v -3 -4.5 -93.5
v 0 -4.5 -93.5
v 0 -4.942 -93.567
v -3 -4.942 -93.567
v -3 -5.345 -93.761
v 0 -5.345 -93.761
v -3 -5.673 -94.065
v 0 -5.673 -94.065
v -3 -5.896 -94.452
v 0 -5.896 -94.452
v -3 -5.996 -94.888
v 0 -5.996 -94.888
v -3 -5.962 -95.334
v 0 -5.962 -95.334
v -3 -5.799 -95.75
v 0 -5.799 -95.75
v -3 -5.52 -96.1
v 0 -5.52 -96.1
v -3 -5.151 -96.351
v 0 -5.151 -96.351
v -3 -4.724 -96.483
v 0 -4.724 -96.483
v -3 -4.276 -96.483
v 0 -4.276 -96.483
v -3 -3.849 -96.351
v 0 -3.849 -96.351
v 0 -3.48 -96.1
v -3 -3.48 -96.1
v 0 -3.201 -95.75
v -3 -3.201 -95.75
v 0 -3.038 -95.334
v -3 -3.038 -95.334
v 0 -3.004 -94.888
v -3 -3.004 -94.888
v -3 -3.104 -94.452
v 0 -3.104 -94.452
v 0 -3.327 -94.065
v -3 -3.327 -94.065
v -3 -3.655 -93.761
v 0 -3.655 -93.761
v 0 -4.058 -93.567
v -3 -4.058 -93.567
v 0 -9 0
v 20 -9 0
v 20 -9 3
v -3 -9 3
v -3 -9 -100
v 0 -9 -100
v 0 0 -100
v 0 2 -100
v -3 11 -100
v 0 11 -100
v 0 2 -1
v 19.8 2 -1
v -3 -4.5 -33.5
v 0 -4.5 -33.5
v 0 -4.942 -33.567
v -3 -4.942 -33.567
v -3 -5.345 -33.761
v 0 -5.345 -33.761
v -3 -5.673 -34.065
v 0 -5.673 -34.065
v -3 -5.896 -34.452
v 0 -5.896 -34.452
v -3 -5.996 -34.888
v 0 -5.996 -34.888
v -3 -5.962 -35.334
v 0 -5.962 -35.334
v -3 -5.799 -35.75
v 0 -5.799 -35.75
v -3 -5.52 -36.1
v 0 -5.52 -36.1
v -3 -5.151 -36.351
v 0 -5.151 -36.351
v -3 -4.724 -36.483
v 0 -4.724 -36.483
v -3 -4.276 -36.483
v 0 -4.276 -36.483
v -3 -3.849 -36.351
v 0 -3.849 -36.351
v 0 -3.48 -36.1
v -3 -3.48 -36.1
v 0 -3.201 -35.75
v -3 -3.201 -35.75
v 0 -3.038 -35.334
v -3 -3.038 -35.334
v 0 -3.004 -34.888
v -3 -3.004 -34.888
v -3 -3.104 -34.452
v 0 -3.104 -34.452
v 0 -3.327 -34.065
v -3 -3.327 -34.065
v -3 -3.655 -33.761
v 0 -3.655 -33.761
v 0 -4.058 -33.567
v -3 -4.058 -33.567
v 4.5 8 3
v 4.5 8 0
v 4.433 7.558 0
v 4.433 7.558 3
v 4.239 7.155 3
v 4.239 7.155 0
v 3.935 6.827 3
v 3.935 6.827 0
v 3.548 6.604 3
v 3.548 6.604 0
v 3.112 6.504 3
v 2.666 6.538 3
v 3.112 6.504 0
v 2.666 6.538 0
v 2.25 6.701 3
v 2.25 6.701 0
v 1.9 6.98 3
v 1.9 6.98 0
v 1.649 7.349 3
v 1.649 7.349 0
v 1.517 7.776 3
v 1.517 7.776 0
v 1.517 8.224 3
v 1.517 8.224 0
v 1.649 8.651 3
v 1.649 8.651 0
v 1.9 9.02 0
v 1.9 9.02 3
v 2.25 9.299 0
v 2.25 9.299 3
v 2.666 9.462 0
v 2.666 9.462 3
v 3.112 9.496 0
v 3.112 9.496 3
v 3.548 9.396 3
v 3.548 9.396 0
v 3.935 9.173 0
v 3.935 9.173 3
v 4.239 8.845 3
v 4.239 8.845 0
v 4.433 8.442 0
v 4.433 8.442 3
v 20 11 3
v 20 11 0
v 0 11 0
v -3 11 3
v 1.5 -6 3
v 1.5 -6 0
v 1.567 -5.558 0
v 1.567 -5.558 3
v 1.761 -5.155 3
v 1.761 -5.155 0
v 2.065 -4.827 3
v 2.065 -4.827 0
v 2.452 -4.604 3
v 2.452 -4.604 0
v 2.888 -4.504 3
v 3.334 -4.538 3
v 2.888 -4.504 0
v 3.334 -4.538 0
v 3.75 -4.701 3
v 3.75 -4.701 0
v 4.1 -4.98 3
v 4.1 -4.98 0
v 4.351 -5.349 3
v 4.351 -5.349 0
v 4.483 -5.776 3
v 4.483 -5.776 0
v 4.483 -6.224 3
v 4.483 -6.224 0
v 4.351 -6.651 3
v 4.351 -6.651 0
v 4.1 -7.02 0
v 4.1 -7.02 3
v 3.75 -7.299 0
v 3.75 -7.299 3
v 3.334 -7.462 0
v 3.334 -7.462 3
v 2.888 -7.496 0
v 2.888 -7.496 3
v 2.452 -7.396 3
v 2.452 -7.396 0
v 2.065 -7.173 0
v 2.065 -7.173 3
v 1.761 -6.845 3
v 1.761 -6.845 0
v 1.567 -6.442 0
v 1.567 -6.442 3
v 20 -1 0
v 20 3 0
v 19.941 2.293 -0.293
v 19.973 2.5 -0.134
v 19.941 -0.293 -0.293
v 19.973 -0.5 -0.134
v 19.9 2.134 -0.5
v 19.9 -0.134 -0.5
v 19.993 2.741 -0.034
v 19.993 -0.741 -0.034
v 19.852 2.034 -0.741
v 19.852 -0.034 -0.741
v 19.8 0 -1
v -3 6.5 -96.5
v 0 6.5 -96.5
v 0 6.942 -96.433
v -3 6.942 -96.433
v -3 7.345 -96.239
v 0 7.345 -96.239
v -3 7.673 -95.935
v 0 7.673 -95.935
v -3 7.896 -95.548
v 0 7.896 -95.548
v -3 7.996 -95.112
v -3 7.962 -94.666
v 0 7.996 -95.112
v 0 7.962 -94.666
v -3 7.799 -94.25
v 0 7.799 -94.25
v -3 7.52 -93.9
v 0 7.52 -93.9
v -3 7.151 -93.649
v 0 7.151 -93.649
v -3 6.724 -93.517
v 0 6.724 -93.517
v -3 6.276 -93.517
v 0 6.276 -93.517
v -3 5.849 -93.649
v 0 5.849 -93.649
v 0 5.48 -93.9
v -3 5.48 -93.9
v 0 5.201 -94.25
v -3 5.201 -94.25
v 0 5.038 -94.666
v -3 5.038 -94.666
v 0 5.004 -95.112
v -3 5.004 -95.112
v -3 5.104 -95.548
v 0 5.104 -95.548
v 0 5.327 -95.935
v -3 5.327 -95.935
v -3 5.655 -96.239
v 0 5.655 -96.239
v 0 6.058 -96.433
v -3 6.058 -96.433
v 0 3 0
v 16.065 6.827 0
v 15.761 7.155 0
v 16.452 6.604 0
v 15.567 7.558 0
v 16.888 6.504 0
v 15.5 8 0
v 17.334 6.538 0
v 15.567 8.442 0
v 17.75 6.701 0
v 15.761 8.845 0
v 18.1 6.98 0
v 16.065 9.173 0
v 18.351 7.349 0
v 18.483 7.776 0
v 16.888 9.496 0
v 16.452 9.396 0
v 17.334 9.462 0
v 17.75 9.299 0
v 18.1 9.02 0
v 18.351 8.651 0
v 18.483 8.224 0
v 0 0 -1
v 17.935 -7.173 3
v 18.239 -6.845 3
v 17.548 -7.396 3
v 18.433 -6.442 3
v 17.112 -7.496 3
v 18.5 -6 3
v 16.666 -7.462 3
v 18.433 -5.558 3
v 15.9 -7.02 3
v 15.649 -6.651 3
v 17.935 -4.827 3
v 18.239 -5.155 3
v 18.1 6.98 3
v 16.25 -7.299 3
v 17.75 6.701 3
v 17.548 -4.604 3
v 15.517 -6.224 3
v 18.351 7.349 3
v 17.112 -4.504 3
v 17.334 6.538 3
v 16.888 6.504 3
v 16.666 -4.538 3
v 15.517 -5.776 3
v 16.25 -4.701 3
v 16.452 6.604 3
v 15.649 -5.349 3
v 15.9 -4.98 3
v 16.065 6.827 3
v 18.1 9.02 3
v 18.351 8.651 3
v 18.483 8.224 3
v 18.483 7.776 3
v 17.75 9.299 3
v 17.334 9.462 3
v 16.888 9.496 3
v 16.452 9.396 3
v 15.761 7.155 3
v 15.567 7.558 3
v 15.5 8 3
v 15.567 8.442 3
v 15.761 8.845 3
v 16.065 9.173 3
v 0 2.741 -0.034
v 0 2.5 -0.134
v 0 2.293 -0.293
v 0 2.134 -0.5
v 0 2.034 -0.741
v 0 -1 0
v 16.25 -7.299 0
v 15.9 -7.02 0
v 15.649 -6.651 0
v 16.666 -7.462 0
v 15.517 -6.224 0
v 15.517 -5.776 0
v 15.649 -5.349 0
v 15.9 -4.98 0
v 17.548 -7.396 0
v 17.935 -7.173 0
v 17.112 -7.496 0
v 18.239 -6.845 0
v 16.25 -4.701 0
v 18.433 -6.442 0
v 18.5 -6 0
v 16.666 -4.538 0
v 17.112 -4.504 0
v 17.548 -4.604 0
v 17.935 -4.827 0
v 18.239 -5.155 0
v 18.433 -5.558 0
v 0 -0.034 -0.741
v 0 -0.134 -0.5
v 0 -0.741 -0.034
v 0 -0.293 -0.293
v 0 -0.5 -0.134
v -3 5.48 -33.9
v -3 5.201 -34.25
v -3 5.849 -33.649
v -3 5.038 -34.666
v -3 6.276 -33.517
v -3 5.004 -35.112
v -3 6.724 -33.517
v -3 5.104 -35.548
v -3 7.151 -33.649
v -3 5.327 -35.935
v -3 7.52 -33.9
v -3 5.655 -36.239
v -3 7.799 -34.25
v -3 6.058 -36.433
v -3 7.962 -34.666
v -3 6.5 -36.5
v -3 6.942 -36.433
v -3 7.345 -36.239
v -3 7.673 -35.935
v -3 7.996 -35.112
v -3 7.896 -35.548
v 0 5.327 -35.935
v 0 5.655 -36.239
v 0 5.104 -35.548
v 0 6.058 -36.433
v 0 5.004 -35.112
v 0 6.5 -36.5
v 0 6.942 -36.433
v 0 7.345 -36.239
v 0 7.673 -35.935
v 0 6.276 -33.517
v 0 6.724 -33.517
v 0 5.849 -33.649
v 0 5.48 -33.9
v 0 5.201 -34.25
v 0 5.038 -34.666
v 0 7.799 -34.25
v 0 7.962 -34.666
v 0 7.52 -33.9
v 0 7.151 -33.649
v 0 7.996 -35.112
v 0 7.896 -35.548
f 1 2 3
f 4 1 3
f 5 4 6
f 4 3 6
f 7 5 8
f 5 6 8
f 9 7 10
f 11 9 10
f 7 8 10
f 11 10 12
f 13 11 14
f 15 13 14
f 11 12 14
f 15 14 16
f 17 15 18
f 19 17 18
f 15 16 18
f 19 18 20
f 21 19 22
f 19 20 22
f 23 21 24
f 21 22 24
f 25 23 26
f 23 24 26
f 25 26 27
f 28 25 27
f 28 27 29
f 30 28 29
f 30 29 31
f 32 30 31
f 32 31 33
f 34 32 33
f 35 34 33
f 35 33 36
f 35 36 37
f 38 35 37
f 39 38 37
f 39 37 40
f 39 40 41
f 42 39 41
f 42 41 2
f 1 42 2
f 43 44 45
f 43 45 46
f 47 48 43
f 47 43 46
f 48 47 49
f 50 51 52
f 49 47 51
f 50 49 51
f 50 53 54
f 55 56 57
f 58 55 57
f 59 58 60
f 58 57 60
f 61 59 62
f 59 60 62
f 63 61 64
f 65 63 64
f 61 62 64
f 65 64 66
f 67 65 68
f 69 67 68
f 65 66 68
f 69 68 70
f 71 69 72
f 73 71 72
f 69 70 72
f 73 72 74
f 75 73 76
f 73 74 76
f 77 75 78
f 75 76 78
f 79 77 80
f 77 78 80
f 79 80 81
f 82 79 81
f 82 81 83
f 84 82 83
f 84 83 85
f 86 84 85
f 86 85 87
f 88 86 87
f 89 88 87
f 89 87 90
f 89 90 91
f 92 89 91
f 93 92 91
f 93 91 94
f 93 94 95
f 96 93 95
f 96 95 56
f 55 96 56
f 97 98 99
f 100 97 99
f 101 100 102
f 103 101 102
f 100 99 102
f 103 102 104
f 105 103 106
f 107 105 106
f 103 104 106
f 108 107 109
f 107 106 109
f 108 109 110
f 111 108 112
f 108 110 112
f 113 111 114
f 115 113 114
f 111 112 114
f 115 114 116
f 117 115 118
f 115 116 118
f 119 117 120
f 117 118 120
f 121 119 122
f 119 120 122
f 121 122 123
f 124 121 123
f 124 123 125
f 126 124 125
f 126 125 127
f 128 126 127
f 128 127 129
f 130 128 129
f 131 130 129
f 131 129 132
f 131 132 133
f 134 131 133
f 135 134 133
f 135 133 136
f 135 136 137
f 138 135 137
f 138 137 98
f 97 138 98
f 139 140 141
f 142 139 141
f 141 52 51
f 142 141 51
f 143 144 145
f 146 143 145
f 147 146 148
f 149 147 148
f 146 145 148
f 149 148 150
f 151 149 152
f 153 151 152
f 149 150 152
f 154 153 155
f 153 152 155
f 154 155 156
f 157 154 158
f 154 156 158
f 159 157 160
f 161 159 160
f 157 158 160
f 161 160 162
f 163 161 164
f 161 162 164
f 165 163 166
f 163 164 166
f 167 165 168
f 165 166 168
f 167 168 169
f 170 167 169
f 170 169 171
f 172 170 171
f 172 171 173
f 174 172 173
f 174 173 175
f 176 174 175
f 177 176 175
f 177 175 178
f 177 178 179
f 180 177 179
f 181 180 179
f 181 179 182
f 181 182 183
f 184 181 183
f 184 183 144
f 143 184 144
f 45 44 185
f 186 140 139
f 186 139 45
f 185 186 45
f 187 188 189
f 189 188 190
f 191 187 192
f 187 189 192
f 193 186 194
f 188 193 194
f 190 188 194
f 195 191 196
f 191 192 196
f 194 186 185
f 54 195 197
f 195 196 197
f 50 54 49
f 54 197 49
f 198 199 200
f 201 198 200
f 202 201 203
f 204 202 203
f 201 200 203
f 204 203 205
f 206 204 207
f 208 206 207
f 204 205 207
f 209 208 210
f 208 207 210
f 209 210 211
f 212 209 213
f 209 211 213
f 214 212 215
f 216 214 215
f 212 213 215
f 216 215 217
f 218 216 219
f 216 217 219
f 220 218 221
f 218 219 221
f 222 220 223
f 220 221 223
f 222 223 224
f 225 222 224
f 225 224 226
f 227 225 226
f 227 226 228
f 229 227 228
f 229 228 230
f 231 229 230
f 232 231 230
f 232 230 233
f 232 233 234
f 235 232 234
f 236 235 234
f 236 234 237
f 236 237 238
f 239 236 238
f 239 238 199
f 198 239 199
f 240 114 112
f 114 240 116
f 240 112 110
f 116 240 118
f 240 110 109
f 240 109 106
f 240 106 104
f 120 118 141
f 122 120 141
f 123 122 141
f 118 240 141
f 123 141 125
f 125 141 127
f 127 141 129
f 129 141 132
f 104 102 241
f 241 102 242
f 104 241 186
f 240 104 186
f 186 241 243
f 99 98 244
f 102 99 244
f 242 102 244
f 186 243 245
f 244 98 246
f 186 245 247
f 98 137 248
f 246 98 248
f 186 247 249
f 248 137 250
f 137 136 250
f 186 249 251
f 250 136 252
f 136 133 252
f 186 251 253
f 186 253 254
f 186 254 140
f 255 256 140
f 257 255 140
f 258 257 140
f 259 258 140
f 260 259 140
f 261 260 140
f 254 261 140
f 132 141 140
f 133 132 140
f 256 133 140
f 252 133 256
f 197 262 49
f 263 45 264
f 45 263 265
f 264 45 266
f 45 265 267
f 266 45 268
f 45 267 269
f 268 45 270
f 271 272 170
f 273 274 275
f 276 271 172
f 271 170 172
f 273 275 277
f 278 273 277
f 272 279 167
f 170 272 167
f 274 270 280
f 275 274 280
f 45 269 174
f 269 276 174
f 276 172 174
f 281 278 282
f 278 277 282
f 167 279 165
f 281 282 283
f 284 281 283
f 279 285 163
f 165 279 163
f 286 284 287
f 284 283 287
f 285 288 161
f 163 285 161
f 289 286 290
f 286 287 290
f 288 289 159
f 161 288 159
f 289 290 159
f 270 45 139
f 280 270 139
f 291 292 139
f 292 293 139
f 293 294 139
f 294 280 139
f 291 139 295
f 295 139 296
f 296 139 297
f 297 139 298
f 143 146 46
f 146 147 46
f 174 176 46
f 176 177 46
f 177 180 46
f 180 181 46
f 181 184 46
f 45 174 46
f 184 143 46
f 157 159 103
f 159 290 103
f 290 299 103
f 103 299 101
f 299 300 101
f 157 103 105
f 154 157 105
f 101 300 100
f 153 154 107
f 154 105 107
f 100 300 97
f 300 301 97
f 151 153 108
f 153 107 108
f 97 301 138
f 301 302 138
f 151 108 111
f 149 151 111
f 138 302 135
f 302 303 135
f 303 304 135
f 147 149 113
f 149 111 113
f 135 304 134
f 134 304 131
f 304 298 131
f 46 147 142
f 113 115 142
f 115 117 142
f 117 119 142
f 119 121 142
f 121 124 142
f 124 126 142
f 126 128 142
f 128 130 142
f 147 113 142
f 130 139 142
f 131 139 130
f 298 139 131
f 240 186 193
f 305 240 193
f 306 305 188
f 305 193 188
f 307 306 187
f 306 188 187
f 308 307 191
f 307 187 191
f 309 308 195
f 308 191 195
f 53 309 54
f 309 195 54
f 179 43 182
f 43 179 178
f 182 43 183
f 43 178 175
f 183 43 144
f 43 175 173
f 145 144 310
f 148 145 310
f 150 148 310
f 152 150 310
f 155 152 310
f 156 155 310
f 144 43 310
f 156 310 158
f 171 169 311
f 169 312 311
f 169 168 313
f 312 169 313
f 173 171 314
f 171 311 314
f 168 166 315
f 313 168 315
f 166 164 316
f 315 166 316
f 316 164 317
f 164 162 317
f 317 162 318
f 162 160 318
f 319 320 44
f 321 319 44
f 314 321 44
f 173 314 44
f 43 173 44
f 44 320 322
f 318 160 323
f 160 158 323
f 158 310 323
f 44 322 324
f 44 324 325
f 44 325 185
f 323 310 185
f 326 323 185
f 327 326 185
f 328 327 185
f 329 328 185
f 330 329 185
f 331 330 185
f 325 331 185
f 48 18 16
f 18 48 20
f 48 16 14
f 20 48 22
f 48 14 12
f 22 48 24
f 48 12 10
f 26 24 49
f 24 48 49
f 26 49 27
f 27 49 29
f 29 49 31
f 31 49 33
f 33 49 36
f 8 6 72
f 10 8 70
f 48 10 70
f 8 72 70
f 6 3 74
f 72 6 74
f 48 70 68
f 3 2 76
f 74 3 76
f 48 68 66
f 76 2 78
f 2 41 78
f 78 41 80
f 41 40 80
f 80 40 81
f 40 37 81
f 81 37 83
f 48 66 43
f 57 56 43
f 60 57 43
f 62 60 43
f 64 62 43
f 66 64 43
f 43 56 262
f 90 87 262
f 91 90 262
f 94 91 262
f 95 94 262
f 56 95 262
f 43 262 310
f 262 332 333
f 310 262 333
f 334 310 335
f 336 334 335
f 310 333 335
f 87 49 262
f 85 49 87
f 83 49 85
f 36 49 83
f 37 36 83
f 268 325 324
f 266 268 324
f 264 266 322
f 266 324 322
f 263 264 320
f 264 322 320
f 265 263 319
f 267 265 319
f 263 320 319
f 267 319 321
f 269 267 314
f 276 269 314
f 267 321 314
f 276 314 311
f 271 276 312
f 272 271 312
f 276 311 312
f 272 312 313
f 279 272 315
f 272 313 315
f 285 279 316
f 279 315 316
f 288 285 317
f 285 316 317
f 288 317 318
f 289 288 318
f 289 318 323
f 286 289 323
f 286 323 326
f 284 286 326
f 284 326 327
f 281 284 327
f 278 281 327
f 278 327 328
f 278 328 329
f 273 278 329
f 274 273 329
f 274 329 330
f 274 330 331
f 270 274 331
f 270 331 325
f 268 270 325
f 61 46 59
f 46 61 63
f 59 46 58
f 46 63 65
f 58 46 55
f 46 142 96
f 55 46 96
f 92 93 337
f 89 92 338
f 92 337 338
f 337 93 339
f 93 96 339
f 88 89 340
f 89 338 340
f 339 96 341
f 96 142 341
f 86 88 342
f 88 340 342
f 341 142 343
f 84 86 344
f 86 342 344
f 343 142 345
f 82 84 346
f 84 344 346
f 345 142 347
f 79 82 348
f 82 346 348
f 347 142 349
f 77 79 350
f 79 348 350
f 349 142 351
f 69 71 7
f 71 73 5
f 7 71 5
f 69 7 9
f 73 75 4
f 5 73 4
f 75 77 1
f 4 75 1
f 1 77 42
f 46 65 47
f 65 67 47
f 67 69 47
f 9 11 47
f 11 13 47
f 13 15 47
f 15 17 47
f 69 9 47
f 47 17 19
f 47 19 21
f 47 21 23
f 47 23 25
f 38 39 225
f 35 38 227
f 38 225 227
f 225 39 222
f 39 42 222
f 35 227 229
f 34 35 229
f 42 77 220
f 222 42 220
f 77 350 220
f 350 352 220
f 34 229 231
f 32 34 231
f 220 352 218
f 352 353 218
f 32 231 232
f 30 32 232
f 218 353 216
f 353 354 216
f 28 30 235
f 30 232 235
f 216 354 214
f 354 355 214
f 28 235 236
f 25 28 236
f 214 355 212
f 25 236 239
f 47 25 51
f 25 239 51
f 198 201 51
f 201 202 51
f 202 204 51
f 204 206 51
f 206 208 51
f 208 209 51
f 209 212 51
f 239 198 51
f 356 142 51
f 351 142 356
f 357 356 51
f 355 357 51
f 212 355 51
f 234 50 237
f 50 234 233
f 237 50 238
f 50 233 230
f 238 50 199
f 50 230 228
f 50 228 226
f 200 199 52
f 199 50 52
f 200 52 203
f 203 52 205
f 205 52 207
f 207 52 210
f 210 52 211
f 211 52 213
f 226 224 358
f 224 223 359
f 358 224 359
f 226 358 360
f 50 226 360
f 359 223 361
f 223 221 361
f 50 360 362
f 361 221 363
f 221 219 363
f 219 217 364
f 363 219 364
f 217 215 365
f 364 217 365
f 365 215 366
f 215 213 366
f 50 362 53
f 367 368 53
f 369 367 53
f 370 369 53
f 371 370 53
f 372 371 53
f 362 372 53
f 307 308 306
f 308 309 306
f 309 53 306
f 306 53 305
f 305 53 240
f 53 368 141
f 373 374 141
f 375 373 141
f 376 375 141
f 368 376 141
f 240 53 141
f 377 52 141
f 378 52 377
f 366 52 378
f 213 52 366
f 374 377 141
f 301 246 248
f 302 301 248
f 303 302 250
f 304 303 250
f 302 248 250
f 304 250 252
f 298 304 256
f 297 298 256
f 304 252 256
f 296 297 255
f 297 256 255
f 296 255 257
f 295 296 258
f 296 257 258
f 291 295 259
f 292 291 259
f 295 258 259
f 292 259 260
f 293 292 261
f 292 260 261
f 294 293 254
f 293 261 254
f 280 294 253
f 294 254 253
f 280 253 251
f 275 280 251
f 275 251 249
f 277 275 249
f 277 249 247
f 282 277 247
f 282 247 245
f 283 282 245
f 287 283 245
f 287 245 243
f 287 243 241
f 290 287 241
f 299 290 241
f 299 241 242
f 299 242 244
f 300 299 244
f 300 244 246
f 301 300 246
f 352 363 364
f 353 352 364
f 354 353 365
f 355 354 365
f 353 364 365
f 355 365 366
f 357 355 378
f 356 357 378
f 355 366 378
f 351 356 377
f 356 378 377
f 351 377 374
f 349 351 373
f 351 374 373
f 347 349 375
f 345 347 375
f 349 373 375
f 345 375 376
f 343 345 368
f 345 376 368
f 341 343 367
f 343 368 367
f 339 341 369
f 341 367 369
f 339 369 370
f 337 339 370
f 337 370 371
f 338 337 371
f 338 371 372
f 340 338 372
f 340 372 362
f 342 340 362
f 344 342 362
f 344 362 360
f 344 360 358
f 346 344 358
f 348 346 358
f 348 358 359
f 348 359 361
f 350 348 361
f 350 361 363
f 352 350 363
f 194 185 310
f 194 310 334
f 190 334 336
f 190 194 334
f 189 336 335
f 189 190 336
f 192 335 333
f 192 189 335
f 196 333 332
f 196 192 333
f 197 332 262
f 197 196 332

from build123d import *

# Parameters (mm, degrees)
EXTRUDE_1_DEPTH      = 2
EXTRUDE_2_DEPTH      = 10
EXTRUDE_2_DEPTH_BACK = 10
SKETCH_3_R           = 1.5
CUT_EXTRUDE_1_DEPTH  = 103.571925984
SKETCH_4_R           = 1.5
CUT_EXTRUDE_2_DEPTH  = 103.571925984
FILLET_1_R           = 1


with BuildPart() as part:
    # 草图1 → 凸台-拉伸1 (new body)
    with BuildSketch(Plane(origin=(0, 0, 0), x_dir=(1, 0, 0), z_dir=(0, 1, 0))):
        Polygon((0, 100), (0, 0), (20, 0), align=None)
    extrude(amount=EXTRUDE_1_DEPTH)

    # 草图2 → 凸台-拉伸2 (add, two sides: drawn at the far end of the back side and taken through both)
    with BuildSketch(Plane(origin=(0, 1, 0), x_dir=(-1, 0, 0), z_dir=(0, -1, 0)).offset(-EXTRUDE_2_DEPTH_BACK)):
        Polygon((-20, 0), (-20, -3), (3, -3), (3, 100), (0, 100), (0, 0), align=None)
    extrude(amount=EXTRUDE_2_DEPTH + EXTRUDE_2_DEPTH_BACK)

    # 草图3 → 切除-拉伸1 (cut, through all)
    with BuildSketch(Plane(origin=(0, 0, 0), x_dir=(0, 0, -1), z_dir=(1, 0, 0))):
        with Locations((95, 6.5)):
            Circle(SKETCH_3_R)
        with Locations((35, 6.5)):
            Circle(SKETCH_3_R)
        with Locations(Location((95, -4.5, 0), (0, 0, 180))):
            Circle(SKETCH_3_R)
        with Locations(Location((35, -4.5, 0), (0, 0, 180))):
            Circle(SKETCH_3_R)
    extrude(amount=-CUT_EXTRUDE_1_DEPTH, mode=Mode.SUBTRACT)

    # 草图4 → 切除-拉伸2 (cut, through all)
    with BuildSketch(Plane(origin=(0, 0, 0), x_dir=(-1, 0, 0), z_dir=(0, 0, -1))):
        with Locations((-17, 8)):
            Circle(SKETCH_4_R)
        with Locations(Location((-17, -6, 0), (0, 0, 180))):
            Circle(SKETCH_4_R)
        with Locations((-3, -6)):
            Circle(SKETCH_4_R)
        with Locations(Location((-3, 8, 0), (0, 0, 180))):
            Circle(SKETCH_4_R)
    extrude(amount=-CUT_EXTRUDE_2_DEPTH, mode=Mode.SUBTRACT)

    # 圆角1
    fillet_1_edges = [part.edges().sort_by_distance(p)[0] for p in [
        (10, 2, 0),
        (10, 0, 0),
    ]]
    fillet(fillet_1_edges, radius=FILLET_1_R)


solid = part.part
